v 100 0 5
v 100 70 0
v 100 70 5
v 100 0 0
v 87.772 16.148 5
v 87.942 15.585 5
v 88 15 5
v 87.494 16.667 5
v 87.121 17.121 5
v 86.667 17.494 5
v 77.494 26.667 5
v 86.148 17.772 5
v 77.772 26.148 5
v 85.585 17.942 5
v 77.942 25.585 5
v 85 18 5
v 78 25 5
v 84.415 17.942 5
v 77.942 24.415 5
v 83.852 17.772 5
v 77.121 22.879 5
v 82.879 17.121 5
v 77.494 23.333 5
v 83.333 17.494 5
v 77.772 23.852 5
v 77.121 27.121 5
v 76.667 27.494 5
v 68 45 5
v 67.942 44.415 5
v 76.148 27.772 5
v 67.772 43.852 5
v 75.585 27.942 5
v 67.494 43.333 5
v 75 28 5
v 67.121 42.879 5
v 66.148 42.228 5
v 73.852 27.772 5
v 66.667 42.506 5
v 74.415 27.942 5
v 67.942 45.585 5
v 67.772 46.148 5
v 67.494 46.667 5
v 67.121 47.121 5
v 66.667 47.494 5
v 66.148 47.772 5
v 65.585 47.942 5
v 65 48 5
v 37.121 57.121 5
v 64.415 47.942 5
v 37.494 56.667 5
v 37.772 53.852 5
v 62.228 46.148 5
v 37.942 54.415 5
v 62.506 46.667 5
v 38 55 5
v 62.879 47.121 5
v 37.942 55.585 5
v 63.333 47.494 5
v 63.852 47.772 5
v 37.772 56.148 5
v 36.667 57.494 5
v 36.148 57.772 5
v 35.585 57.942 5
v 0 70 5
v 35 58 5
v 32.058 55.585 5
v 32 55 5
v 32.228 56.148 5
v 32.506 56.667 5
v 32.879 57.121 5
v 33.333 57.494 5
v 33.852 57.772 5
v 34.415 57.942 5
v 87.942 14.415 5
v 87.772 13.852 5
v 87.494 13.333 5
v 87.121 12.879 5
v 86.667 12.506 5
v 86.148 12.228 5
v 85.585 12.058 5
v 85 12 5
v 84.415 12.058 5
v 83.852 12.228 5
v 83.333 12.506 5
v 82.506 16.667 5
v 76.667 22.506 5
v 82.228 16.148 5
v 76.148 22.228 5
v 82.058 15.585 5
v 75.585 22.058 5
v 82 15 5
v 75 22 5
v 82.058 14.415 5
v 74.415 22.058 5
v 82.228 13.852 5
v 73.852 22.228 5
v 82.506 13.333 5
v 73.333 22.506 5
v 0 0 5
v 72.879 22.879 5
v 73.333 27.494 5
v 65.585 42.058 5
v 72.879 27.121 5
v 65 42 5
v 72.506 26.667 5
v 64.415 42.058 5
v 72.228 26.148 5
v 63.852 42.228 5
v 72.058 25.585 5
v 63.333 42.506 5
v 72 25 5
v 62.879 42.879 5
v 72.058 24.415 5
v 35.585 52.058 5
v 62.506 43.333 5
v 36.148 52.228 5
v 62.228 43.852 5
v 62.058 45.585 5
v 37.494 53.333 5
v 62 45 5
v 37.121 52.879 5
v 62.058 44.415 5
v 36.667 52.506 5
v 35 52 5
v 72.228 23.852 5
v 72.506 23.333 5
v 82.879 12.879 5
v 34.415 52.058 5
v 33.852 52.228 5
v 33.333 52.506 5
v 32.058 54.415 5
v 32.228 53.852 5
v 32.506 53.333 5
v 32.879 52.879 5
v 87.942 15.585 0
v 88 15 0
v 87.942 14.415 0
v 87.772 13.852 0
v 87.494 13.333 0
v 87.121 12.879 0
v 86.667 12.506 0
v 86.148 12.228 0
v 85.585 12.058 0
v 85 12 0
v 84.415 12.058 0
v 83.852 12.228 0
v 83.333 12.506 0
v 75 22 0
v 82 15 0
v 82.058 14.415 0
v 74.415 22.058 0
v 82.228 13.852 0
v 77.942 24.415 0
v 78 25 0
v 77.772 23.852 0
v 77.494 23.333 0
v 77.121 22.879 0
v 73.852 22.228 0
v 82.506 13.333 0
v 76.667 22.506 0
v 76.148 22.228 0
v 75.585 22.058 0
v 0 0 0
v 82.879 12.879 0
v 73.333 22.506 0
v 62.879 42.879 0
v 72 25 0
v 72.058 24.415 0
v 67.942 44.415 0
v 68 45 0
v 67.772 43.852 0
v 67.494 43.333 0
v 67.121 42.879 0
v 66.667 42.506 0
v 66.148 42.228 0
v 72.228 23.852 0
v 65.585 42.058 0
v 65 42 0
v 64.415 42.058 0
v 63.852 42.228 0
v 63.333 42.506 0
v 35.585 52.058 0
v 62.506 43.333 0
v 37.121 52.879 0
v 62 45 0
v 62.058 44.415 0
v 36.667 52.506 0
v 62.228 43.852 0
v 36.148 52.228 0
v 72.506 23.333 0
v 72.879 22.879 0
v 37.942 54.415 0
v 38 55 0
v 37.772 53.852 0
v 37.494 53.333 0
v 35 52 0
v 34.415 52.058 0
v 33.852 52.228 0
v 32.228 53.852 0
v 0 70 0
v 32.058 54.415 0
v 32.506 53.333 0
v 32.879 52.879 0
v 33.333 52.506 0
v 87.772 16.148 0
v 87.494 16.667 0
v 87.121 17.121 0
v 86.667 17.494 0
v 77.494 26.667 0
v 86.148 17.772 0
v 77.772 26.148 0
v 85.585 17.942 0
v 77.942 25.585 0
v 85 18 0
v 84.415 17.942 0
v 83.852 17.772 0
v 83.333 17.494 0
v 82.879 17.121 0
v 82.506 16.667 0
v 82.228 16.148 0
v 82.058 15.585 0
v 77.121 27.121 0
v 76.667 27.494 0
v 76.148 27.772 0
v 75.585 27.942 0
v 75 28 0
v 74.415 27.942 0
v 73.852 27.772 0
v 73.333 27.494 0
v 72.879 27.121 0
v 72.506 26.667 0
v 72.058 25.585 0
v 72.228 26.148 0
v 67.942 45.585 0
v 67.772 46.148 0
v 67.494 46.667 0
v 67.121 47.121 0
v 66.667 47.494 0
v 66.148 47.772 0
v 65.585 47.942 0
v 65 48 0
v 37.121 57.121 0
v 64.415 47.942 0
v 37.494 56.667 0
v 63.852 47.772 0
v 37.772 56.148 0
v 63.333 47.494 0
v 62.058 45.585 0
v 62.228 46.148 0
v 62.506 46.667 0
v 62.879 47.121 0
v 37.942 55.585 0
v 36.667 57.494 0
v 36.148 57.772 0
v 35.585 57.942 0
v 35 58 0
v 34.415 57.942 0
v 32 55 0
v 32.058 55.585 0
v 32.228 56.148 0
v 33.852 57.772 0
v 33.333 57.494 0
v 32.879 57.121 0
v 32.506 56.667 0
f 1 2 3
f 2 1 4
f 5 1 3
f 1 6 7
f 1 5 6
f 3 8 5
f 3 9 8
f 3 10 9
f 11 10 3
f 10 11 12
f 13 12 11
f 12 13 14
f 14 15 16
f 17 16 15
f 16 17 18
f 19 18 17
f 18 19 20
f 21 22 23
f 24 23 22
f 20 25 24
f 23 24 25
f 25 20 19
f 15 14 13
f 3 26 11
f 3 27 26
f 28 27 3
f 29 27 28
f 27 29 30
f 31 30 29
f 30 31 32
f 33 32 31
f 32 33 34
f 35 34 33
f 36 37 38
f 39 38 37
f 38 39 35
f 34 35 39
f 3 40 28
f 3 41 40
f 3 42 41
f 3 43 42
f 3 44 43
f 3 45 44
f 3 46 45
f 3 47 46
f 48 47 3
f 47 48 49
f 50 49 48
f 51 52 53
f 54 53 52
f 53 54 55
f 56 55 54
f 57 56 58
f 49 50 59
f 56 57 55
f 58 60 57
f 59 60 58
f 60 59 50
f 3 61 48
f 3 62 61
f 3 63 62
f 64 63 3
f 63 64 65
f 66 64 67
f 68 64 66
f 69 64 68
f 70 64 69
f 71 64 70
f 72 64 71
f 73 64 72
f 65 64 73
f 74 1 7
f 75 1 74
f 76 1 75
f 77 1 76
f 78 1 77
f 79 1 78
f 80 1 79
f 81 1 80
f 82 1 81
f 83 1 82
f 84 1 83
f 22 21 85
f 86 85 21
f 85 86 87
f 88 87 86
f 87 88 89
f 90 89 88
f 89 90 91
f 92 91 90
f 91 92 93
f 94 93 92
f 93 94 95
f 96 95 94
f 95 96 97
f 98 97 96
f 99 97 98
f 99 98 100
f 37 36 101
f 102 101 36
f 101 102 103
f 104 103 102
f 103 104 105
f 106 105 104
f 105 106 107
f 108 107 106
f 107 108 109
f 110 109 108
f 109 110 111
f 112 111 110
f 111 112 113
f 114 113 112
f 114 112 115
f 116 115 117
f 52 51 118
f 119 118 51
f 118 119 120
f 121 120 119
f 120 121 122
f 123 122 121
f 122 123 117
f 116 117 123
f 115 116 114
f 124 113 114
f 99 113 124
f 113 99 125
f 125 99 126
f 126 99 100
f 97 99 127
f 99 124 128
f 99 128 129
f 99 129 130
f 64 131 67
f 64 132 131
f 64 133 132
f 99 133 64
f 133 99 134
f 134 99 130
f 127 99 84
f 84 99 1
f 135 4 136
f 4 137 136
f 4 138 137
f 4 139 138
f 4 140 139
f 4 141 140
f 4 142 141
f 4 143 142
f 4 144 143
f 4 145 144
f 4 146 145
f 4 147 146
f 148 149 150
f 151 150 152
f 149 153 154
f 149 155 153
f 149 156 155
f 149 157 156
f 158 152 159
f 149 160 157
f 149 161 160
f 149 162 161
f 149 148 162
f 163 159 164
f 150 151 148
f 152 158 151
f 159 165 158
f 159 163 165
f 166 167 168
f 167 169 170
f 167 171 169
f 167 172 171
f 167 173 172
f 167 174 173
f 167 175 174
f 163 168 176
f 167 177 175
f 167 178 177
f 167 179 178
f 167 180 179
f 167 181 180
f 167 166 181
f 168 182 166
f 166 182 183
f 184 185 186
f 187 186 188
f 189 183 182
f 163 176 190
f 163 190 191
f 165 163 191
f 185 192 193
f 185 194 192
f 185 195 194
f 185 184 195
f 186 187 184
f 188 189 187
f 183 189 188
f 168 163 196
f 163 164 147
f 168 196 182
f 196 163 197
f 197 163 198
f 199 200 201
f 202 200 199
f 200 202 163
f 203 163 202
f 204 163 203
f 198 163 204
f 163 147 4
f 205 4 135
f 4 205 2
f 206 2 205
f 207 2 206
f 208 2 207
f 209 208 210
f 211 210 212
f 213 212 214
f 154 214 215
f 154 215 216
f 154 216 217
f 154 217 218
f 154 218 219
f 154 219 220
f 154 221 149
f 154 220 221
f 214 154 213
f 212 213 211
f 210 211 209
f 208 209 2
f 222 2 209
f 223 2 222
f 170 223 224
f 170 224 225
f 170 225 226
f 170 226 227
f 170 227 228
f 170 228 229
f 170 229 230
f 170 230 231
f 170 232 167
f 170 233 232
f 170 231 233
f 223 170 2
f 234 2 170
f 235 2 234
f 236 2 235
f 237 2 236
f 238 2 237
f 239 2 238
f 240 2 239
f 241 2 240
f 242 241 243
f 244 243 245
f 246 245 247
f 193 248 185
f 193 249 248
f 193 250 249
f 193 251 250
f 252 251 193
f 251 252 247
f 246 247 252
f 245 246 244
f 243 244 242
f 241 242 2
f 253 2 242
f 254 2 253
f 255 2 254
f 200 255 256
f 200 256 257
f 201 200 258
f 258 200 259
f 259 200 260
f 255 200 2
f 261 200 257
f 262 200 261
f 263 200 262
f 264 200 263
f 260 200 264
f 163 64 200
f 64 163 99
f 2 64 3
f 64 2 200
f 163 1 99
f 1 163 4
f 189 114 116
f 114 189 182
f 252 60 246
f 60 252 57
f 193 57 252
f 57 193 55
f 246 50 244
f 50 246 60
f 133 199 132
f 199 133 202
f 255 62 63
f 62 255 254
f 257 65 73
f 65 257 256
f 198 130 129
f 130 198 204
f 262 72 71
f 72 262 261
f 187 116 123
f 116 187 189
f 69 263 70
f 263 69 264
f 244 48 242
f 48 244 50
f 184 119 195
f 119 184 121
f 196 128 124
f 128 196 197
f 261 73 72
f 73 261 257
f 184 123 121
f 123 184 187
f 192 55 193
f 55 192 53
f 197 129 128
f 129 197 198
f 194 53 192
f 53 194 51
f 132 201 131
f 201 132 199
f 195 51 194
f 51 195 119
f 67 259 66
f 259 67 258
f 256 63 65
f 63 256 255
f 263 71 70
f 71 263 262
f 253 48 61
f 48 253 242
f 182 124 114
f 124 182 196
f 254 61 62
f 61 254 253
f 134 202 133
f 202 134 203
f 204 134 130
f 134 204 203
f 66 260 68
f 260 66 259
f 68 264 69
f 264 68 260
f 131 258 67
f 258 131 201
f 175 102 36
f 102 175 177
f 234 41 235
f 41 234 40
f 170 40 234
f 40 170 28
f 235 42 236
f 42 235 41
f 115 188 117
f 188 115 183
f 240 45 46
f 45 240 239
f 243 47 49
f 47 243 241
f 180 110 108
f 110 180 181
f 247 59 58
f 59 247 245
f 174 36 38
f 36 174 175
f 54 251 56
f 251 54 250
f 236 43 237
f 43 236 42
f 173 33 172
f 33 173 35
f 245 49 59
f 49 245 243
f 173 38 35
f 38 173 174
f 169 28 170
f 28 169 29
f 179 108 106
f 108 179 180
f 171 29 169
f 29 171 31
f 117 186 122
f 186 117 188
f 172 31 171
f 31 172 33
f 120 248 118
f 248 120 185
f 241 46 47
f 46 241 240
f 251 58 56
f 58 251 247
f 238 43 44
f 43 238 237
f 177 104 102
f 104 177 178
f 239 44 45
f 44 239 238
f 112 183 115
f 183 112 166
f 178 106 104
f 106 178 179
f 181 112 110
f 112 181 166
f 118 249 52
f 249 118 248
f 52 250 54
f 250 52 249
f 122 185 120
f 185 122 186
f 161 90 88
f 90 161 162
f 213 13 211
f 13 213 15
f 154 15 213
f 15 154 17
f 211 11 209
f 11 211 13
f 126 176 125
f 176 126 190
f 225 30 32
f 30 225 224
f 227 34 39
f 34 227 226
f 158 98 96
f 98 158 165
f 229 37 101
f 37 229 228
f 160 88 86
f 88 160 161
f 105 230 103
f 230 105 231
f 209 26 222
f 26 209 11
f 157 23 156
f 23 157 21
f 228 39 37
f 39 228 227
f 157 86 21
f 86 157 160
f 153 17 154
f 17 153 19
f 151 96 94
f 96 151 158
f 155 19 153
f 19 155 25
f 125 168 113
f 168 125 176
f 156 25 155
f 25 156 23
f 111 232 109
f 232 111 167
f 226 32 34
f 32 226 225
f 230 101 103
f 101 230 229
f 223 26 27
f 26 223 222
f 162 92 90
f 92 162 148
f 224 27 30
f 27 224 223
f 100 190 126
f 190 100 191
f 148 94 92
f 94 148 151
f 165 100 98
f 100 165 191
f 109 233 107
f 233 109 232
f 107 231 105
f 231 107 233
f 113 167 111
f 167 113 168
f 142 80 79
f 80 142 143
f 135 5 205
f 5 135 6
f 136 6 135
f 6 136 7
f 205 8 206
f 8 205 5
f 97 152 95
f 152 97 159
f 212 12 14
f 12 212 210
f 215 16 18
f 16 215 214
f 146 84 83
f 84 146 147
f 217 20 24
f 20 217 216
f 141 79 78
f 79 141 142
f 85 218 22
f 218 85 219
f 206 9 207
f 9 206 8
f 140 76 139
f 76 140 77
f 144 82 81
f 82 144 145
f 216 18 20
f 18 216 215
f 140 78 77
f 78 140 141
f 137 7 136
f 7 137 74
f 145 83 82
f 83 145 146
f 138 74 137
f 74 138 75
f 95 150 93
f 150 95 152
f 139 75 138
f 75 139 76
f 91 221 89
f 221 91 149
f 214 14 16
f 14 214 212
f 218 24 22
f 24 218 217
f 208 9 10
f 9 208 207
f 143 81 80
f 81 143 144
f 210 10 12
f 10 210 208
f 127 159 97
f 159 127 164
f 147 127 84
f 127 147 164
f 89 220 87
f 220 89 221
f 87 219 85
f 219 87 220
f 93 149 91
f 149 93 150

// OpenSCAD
$fn = 32;

// ----------------------------------------------------------------------
// Hole field: plate with holes at given coordinates
// ----------------------------------------------------------------------

// --- parameters (mm) ---
plate_l = 100;            // plate length, X
plate_w = 70;             // plate width, Y
plate_t = 5;              // plate thickness, Z
hole_d = 6;               // hole diameter

difference() {
  cube([plate_l, plate_w, plate_t]);
  translate([35, 55, -1]) cylinder(h = plate_t + 2, d = hole_d);
  translate([65, 45, -1]) cylinder(h = plate_t + 2, d = hole_d);
  translate([75, 25, -1]) cylinder(h = plate_t + 2, d = hole_d);
  translate([85, 15, -1]) cylinder(h = plate_t + 2, d = hole_d);
}
